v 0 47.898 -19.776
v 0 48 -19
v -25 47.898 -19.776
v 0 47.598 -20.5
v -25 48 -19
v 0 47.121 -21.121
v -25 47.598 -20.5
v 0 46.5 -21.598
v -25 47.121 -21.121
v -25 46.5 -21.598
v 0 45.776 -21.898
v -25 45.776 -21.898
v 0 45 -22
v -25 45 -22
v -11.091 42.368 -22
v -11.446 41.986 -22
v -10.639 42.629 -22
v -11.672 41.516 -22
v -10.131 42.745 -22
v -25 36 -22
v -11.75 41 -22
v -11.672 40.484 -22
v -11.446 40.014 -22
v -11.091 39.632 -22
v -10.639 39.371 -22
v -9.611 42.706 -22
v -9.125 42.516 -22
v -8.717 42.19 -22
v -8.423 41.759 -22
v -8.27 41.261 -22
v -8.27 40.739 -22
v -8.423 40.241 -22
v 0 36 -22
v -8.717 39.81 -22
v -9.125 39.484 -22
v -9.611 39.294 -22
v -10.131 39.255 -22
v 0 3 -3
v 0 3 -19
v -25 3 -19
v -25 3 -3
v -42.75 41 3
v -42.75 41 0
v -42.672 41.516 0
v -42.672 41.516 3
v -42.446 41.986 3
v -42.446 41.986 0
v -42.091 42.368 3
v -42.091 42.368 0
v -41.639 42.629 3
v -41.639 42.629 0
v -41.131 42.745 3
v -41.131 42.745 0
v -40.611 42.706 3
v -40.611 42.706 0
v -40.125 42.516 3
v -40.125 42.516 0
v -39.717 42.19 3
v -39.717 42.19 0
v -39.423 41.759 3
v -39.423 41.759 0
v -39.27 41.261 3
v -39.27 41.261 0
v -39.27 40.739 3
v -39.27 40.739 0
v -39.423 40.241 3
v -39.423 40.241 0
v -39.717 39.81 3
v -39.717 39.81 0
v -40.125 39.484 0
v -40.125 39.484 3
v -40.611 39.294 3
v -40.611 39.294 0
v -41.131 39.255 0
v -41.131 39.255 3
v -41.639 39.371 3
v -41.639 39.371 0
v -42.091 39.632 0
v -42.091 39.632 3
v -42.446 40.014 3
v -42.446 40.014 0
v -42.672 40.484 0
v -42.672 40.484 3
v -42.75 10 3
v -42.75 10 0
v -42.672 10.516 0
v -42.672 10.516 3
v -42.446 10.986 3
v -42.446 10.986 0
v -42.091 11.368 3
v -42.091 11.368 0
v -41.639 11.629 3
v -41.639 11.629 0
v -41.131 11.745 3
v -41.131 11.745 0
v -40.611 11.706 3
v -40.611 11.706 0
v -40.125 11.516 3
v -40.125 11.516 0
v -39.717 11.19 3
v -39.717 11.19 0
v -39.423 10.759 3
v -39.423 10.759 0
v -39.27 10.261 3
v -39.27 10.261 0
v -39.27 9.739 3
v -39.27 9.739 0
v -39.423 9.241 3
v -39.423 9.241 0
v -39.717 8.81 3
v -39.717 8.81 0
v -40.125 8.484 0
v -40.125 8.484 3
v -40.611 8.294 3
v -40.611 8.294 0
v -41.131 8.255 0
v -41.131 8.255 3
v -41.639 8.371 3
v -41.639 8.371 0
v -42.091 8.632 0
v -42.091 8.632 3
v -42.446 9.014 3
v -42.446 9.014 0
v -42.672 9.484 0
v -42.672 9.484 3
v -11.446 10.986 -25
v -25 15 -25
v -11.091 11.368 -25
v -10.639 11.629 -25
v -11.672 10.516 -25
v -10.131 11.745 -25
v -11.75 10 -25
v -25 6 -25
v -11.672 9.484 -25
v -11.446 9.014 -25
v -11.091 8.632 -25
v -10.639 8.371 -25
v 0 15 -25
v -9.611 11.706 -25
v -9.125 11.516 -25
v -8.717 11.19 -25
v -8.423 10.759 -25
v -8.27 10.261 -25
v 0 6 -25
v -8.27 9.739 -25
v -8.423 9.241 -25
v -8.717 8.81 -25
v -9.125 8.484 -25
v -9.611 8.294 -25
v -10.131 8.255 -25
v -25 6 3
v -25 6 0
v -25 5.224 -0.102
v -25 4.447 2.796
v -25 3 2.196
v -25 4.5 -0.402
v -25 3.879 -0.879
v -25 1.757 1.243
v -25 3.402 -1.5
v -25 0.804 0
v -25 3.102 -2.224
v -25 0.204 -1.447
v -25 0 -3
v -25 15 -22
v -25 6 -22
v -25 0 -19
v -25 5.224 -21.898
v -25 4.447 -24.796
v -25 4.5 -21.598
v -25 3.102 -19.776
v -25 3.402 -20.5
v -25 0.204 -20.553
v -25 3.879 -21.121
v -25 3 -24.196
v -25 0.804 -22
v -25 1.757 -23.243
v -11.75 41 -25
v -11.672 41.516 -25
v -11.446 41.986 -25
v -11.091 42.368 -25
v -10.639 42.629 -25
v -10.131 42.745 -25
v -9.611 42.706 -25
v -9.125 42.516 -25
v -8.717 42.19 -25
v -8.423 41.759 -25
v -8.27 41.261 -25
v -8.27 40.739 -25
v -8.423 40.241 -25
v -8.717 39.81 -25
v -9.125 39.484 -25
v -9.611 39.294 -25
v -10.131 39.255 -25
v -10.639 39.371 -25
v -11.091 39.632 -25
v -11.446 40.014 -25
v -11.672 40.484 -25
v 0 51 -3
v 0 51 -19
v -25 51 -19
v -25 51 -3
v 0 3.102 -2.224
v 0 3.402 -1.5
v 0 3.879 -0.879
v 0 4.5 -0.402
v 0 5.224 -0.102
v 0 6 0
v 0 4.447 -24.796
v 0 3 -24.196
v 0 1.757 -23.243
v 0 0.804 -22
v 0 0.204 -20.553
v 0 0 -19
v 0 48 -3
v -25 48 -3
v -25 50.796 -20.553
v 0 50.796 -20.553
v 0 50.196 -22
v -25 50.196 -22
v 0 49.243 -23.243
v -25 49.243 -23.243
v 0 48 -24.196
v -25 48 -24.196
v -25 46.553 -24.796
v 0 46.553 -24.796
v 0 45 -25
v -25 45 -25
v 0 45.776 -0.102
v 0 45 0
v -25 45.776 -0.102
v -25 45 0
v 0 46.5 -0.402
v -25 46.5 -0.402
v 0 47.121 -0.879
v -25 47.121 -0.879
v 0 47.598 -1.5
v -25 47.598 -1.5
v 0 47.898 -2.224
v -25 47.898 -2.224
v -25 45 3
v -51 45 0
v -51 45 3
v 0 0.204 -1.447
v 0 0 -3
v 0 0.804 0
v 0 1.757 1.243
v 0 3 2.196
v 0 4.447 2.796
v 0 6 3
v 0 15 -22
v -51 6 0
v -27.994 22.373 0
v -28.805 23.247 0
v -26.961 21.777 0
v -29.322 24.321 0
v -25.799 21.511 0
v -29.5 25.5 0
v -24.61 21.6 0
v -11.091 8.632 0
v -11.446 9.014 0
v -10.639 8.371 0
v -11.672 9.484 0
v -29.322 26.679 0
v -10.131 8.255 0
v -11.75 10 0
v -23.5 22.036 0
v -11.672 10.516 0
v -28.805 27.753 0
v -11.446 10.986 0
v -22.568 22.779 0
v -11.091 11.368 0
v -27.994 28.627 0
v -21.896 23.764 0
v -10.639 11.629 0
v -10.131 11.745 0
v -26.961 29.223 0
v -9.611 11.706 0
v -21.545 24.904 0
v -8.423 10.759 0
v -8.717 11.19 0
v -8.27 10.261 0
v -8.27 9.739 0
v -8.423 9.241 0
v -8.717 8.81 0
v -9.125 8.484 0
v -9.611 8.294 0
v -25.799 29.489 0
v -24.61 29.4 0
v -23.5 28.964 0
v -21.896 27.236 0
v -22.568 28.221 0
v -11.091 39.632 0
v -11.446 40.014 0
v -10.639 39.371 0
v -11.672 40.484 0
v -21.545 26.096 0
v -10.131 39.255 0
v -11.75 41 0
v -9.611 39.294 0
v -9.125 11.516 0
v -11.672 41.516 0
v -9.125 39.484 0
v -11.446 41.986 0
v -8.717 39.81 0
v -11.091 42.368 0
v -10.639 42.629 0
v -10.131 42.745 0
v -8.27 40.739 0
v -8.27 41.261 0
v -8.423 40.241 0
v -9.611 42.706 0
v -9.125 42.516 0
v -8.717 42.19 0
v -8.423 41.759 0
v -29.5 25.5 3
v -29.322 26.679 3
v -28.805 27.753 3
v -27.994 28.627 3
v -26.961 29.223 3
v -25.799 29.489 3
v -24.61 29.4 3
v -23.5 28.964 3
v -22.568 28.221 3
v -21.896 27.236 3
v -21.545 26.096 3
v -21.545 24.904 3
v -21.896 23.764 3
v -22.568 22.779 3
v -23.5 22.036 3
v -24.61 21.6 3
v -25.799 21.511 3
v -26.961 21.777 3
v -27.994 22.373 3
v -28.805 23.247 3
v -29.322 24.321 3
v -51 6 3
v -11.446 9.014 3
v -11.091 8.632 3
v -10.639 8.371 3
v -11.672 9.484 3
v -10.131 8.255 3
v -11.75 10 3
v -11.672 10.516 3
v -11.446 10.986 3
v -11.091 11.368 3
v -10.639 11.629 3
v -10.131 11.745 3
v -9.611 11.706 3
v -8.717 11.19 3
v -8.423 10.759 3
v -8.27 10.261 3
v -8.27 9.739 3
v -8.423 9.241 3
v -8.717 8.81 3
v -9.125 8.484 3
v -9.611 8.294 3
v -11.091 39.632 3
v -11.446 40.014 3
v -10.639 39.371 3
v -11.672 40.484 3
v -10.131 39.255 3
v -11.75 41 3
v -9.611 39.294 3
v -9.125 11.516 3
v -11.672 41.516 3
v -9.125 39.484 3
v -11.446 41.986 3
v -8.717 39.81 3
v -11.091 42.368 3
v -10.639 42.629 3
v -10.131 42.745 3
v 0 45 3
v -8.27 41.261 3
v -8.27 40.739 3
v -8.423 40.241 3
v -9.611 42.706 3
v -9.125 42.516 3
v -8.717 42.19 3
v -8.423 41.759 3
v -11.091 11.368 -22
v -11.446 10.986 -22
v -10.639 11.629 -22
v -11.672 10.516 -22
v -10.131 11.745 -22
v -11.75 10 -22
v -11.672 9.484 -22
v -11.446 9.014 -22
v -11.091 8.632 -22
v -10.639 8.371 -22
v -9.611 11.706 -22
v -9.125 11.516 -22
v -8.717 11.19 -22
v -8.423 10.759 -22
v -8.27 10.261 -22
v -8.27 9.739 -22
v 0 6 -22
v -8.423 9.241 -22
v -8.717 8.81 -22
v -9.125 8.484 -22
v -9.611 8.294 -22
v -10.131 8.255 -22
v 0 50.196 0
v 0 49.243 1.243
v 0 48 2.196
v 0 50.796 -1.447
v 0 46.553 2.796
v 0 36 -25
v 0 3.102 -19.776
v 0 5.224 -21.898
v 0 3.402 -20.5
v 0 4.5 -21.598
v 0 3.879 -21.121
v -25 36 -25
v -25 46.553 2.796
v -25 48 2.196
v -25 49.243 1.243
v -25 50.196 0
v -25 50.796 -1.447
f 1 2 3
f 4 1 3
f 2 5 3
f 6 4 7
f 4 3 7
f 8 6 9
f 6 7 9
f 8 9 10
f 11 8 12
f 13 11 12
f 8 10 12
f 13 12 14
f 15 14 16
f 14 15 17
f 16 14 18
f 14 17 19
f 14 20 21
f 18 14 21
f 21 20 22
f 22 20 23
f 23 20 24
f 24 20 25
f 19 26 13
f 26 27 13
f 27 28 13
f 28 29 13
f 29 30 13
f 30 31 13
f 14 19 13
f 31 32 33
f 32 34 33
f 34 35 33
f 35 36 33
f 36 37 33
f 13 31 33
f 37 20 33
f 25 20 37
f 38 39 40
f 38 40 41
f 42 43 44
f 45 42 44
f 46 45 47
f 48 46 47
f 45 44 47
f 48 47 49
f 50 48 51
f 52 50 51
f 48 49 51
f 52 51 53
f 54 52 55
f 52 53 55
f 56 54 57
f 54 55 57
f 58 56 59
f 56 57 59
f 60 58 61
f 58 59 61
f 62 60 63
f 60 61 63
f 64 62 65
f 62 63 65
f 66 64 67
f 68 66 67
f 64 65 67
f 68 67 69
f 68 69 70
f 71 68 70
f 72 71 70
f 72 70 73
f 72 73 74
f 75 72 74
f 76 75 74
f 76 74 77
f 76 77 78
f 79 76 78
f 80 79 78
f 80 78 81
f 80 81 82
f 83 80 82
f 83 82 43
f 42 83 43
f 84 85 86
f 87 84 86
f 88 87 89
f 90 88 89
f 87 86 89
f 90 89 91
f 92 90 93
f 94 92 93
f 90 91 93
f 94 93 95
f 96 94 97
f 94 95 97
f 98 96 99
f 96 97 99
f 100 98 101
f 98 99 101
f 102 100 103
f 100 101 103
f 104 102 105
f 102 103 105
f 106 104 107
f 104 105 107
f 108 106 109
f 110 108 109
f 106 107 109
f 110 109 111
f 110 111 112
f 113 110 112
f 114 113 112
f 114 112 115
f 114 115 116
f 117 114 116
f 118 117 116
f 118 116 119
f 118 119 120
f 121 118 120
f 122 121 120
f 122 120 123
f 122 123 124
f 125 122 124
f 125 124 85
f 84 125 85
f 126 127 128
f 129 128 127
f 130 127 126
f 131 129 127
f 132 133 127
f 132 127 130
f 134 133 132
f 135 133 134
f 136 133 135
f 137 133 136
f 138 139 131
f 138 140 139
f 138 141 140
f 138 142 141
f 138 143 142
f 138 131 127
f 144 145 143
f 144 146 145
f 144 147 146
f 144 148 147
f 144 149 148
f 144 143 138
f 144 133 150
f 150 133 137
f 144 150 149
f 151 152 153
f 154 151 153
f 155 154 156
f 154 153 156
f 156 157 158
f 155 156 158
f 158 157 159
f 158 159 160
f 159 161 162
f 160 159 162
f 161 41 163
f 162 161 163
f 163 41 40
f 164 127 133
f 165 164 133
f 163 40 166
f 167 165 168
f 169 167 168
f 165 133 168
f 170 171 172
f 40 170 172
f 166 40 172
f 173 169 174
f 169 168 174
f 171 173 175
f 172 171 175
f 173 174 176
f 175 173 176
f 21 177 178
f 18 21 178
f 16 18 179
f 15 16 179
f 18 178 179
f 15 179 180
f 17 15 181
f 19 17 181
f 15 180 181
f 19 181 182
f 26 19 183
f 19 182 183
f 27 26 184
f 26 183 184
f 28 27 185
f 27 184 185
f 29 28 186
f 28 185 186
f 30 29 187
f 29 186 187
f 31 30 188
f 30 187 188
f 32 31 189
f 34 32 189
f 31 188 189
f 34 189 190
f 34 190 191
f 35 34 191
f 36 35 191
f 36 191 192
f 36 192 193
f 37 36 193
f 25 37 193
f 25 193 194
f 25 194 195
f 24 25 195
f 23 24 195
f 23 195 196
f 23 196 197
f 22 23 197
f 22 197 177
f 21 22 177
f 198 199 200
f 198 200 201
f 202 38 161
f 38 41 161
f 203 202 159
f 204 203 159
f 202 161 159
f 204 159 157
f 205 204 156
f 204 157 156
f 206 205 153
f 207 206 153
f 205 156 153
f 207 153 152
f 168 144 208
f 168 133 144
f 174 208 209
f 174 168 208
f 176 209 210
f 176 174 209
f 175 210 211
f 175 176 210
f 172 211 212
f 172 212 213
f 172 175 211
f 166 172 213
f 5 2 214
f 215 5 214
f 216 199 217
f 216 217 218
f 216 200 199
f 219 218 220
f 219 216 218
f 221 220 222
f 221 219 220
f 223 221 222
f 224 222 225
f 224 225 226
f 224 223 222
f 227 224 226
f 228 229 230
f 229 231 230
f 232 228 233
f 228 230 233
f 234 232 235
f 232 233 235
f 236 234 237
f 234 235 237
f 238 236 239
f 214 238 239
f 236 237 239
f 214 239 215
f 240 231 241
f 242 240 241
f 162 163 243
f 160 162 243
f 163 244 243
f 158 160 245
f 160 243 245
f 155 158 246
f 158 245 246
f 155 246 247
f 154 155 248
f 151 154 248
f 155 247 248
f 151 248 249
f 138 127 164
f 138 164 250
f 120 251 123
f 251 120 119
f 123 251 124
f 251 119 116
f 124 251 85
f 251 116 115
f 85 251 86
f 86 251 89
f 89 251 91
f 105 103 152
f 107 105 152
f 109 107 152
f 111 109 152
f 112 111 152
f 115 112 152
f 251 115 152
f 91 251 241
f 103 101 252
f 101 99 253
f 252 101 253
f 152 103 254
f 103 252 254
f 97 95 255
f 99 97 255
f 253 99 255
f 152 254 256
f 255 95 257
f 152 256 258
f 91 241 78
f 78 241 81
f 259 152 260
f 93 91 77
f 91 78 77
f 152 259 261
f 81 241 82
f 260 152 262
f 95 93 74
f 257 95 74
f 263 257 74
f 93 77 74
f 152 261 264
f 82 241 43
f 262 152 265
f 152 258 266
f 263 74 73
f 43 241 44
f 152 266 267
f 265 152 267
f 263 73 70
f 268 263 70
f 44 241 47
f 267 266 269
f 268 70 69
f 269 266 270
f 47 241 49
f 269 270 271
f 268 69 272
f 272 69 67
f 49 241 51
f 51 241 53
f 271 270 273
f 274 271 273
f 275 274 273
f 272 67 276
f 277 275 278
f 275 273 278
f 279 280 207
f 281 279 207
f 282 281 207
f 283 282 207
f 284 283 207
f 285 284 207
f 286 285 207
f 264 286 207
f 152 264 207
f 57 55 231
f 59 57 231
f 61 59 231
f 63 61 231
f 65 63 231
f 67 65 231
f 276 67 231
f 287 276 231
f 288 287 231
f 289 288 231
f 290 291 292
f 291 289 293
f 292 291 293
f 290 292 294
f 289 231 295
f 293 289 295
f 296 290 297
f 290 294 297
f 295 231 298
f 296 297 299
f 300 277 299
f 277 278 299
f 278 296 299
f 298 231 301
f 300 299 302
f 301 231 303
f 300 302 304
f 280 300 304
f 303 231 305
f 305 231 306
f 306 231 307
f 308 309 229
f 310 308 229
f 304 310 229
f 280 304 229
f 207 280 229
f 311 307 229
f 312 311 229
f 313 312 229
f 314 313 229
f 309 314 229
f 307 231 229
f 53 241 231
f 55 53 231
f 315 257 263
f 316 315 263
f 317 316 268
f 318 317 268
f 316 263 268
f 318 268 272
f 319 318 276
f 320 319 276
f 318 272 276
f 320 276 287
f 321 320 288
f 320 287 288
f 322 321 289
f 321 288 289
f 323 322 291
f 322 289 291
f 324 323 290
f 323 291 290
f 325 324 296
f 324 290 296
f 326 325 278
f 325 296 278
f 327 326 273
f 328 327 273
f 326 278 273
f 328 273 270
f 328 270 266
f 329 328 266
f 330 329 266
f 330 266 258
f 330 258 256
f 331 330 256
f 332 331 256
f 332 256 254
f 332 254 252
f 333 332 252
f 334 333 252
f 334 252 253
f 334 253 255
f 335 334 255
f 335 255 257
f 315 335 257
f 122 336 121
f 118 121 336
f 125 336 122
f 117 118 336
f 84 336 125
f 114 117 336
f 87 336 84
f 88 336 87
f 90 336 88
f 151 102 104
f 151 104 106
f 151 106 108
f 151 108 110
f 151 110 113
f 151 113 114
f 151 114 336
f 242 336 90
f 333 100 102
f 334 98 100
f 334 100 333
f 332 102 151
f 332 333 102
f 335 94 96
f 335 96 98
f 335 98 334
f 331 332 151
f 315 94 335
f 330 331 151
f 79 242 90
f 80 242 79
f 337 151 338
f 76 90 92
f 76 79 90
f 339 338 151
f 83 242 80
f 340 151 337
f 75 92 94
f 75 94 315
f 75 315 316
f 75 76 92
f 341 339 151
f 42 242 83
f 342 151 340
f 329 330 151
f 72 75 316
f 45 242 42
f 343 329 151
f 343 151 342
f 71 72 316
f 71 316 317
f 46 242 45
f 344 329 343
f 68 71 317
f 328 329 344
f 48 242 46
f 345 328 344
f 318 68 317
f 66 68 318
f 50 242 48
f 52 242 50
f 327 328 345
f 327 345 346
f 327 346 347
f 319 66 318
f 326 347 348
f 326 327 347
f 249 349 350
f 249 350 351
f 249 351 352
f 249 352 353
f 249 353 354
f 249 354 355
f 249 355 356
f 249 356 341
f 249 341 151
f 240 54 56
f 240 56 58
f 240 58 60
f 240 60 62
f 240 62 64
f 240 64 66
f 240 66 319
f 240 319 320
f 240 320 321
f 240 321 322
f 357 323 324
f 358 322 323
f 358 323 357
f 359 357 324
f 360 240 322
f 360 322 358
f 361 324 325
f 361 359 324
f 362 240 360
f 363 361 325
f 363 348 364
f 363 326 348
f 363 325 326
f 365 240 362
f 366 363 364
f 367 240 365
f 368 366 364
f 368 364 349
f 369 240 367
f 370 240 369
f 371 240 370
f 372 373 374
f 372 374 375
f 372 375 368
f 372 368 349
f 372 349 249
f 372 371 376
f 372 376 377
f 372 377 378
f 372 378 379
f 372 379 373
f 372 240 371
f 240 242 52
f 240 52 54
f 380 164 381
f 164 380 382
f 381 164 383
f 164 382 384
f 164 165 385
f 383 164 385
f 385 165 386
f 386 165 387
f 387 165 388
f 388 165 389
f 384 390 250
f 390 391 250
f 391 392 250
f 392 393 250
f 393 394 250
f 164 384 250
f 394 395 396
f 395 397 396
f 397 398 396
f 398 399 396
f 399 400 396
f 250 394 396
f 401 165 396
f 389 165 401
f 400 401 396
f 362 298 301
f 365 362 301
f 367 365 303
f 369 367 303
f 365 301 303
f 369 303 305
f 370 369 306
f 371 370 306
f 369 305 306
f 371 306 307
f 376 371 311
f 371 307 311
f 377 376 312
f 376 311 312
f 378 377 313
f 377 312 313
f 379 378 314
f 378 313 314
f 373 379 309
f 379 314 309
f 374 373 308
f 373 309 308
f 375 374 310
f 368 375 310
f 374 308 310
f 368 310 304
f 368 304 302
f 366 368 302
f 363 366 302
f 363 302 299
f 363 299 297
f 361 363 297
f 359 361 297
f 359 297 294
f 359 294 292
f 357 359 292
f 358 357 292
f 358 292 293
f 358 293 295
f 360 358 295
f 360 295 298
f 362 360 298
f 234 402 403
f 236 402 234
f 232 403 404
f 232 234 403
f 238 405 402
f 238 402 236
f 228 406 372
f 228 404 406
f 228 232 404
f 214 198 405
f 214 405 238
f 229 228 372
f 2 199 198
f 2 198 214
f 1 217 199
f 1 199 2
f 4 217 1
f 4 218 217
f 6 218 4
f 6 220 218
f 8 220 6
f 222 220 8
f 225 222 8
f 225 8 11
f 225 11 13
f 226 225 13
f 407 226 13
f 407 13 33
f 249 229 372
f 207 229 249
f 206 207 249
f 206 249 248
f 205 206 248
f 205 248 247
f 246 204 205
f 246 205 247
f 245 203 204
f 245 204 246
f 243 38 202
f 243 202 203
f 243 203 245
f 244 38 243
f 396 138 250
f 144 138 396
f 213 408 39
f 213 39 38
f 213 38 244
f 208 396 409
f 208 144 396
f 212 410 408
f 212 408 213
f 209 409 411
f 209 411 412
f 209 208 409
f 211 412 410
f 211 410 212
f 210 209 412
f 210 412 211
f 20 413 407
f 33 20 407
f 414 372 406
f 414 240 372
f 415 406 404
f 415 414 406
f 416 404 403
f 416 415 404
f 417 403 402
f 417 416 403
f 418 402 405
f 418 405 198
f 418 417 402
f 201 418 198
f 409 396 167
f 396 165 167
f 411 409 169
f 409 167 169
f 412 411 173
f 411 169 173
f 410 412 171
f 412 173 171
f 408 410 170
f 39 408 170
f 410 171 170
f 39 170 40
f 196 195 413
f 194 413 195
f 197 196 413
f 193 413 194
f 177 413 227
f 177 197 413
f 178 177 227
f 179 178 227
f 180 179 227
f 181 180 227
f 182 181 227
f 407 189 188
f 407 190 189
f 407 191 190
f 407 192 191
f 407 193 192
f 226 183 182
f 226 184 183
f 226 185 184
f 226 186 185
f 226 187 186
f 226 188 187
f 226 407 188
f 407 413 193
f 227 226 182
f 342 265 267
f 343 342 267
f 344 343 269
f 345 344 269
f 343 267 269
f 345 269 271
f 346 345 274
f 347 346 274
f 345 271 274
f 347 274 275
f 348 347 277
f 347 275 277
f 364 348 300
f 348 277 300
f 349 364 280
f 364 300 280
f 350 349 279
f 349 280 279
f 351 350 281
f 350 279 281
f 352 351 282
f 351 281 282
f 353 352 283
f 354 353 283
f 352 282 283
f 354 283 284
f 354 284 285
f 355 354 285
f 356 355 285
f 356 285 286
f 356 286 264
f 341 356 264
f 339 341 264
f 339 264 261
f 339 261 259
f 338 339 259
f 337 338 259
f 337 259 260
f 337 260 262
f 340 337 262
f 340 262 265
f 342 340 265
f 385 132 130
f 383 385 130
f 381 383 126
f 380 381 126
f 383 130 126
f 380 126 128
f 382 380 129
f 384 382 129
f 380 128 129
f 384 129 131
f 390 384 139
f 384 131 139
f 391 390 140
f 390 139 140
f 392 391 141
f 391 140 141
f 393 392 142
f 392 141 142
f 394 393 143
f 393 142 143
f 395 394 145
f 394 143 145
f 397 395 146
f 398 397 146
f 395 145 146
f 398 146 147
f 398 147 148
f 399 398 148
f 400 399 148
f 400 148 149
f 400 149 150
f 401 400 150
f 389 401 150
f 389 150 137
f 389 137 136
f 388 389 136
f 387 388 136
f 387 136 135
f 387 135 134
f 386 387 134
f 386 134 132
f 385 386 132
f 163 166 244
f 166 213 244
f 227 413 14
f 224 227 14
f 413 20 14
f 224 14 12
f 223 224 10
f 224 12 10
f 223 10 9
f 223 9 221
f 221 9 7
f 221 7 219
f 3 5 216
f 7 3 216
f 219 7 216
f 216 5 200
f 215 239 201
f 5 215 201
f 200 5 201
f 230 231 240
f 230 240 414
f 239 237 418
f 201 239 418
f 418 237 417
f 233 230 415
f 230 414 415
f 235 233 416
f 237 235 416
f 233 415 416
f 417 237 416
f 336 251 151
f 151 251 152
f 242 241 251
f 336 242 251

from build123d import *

# Parameters (mm, degrees)
F1_DEPTH = 3
F2_W     = 3
F2_H     = 25
F3_DEPTH = 25
F4_W     = 3
F4_H     = 25
F5_DEPTH = 25
F6_W     = 25
F6_H     = 15
F7_DEPTH = 3
F8_W     = 25
F8_H     = 15
F9_DEPTH = 3
F11_D    = 3.5
F13_D    = 8
F14_R    = 3
F15_R    = 6


with BuildPart() as f1:
    # F0 (on Top) → F1 (new body)
    with BuildSketch(Plane.XY):
        Polygon((-25, 0), (0, 0), (0, 51), (-25, 51), (-25, 45), (-51, 45), (-51, 6), (-25, 6), align=None)
    extrude(amount=F1_DEPTH)

    # F2 (on Right) → F3 (join)
    with BuildSketch(Plane.YZ):
        with Locations((1.5, -12.5)):
            Rectangle(F2_W, F2_H)
    extrude(amount=-F3_DEPTH)

    # F4 (on Right) → F5 (join)
    with BuildSketch(Plane.YZ):
        with Locations((49.5, -12.5)):
            Rectangle(F4_W, F4_H)
    extrude(amount=-F5_DEPTH)

    # F6 (on face) → F7 (join)
    with BuildSketch(Plane(origin=(0, 0, -25), x_dir=(1, 0, 0), z_dir=(0, 0, -1))):
        with Locations((-12.5, -7.5)):
            Rectangle(F6_W, F6_H)
    extrude(amount=-F7_DEPTH)

    # F8 (on face) → F9 (join)
    with BuildSketch(Plane(origin=(0, 0, -25), x_dir=(1, 0, 0), z_dir=(0, 0, -1))):
        with Locations((-12.5, -43.5)):
            Rectangle(F8_W, F8_H)
    extrude(amount=-F9_DEPTH)

    # F11 (through all)
    with Locations(Plane.XY.offset(3)):
        with Locations((-41, 41), (-10, 41), (-10, 10), (-41, 10)):
            Hole(F11_D / 2)

    # F13 (through all)
    with Locations(Plane.XY.offset(3)):
        with Locations((-25.5, 25.5)):
            Hole(F13_D / 2)

    # F14
    f14_edges = [f1.edges().sort_by_distance(p)[0] for p in [
        (-12.5, 3, 0),
        (-12.5, 48, 0),
        (-12.5, 48, -22),
        (-12.5, 3, -22),
    ]]
    fillet(f14_edges, radius=F14_R)

    # F15
    f15_edges = [f1.edges().sort_by_distance(p)[0] for p in [
        (-12.5, 0, 3),
        (-12.5, 0, -25),
        (-12.5, 51, 3),
        (-12.5, 51, -25),
    ]]
    fillet(f15_edges, radius=F15_R)


solid = f1.part
